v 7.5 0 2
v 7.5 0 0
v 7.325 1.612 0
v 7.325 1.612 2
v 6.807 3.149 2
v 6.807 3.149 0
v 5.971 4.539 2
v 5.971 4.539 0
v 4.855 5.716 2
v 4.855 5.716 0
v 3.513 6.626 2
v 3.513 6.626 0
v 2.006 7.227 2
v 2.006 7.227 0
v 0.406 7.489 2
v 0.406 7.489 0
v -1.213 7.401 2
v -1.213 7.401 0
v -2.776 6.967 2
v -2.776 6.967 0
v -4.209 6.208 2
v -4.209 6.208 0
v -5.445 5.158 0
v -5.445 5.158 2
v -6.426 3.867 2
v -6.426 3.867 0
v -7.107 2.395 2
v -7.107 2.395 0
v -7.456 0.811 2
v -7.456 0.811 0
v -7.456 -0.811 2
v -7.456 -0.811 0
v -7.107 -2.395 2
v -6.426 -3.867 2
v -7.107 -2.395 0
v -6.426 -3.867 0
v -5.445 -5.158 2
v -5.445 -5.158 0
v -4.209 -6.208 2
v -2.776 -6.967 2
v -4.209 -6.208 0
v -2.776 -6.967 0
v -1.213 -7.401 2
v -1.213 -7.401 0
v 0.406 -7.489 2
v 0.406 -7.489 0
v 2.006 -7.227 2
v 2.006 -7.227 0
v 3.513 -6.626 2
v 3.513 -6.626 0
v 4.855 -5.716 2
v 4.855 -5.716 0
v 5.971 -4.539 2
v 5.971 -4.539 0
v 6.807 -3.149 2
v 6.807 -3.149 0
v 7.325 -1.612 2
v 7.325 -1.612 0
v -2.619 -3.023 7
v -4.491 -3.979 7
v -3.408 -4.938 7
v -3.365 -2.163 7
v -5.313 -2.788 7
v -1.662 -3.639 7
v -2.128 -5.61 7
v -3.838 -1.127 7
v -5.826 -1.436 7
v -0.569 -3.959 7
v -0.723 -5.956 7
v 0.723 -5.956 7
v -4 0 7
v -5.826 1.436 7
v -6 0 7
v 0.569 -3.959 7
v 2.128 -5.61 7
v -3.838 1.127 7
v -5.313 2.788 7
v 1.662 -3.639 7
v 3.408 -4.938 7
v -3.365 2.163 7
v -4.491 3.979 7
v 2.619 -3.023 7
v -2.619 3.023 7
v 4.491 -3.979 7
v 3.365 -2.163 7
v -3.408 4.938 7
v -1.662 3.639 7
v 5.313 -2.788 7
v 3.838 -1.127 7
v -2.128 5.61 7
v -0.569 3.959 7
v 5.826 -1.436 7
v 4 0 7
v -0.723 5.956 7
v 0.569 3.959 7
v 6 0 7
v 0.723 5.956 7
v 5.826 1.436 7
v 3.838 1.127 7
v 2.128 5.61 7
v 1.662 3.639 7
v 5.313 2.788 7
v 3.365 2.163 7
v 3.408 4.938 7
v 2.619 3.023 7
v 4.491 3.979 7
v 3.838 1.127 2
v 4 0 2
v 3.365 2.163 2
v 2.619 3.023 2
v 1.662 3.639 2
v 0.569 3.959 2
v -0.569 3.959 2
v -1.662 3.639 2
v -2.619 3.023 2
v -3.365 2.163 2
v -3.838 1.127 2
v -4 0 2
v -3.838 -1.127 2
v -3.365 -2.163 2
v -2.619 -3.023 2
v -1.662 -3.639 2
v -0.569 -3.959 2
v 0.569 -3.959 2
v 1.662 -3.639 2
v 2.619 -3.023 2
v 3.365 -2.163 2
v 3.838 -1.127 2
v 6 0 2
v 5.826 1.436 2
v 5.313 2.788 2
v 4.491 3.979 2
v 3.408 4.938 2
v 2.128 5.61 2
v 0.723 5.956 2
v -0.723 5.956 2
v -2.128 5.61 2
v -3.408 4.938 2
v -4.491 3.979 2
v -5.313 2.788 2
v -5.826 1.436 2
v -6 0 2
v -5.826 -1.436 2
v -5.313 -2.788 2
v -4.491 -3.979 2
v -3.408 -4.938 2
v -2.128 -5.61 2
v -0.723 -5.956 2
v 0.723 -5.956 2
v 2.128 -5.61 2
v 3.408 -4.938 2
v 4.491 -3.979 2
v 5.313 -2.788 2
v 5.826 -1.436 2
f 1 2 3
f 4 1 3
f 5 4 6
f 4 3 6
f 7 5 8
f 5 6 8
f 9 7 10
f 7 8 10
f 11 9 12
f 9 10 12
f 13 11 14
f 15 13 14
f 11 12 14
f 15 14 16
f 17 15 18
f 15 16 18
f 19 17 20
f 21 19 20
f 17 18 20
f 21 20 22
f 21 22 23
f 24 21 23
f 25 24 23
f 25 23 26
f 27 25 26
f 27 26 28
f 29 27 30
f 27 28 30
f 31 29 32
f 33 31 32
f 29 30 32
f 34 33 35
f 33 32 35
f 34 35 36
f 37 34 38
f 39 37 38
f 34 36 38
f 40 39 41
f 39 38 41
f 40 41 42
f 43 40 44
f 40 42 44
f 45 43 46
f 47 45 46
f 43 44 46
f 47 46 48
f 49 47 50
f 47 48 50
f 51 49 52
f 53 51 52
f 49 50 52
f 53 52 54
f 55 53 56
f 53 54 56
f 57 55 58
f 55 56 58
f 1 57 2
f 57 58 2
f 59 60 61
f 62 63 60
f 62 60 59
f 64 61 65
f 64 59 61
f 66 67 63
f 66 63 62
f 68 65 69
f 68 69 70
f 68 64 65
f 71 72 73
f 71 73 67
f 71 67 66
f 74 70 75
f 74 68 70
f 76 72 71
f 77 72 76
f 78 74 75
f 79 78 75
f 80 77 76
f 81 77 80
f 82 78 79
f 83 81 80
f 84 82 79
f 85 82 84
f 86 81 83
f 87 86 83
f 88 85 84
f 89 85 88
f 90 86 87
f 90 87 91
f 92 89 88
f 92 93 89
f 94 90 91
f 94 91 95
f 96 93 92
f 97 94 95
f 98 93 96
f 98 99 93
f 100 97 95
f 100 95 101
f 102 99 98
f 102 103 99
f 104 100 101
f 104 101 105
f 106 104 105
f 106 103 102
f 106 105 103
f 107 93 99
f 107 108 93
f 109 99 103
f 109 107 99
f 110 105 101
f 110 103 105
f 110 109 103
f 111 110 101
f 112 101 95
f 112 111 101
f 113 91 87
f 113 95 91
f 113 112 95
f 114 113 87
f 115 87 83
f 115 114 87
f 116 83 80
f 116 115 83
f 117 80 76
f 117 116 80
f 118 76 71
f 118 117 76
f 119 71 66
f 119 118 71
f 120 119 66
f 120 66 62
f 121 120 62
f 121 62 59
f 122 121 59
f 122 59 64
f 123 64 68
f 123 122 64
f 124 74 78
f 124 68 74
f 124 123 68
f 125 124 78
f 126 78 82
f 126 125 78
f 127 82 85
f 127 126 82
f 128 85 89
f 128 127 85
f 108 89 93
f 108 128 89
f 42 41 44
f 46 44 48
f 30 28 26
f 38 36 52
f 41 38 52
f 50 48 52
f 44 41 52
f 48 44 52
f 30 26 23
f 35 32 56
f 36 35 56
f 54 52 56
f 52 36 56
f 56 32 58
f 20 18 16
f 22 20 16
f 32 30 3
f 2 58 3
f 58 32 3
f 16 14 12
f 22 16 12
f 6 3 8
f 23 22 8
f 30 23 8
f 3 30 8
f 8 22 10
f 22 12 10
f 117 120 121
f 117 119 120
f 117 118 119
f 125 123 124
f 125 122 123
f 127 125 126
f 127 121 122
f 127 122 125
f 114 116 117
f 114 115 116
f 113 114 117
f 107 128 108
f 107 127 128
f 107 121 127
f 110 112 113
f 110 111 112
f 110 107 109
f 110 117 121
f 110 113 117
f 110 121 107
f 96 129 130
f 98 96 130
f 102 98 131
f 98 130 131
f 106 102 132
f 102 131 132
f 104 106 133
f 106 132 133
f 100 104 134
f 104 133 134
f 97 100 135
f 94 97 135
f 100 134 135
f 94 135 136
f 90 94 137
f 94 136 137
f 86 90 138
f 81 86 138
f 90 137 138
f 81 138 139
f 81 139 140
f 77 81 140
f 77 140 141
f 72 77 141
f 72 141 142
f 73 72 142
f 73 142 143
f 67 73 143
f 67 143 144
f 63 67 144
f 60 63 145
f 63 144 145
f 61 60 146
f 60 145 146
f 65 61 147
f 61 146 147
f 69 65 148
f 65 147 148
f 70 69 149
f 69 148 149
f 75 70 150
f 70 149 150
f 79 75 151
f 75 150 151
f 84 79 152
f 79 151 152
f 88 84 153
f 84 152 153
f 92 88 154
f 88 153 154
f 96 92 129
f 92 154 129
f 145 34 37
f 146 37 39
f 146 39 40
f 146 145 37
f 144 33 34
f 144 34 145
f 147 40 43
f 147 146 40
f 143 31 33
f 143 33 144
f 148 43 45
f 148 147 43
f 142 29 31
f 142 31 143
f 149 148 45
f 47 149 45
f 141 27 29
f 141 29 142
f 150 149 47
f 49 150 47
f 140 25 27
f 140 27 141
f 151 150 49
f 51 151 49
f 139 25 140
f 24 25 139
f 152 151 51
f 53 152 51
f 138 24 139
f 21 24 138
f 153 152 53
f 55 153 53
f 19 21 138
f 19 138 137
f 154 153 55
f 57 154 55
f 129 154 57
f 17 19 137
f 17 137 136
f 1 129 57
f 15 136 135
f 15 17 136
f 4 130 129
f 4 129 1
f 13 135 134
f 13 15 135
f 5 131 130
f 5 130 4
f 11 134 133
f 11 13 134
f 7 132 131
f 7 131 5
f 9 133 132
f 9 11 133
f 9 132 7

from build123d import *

# Parameters (mm, degrees)
F0_R     = 7.5
F1_DEPTH = 2
F2_R     = 6
F3_DEPTH = 5
F4_T     = -2


with BuildPart() as f1:
    # F0 (on Top) → F1 (new body)
    with BuildSketch(Plane.XY):
        Circle(F0_R)
    extrude(amount=F1_DEPTH)

    # F2 (on face) → F3 (join)
    with BuildSketch(Plane.XY.offset(2)):
        Circle(F2_R)
    extrude(amount=F3_DEPTH)

    # F4
    f4_openings = [f1.faces().sort_by_distance(p)[0] for p in [
        (0, 0, 7),
    ]]
    offset(amount=F4_T, openings=f4_openings, kind=Kind.INTERSECTION)


solid = f1.part
